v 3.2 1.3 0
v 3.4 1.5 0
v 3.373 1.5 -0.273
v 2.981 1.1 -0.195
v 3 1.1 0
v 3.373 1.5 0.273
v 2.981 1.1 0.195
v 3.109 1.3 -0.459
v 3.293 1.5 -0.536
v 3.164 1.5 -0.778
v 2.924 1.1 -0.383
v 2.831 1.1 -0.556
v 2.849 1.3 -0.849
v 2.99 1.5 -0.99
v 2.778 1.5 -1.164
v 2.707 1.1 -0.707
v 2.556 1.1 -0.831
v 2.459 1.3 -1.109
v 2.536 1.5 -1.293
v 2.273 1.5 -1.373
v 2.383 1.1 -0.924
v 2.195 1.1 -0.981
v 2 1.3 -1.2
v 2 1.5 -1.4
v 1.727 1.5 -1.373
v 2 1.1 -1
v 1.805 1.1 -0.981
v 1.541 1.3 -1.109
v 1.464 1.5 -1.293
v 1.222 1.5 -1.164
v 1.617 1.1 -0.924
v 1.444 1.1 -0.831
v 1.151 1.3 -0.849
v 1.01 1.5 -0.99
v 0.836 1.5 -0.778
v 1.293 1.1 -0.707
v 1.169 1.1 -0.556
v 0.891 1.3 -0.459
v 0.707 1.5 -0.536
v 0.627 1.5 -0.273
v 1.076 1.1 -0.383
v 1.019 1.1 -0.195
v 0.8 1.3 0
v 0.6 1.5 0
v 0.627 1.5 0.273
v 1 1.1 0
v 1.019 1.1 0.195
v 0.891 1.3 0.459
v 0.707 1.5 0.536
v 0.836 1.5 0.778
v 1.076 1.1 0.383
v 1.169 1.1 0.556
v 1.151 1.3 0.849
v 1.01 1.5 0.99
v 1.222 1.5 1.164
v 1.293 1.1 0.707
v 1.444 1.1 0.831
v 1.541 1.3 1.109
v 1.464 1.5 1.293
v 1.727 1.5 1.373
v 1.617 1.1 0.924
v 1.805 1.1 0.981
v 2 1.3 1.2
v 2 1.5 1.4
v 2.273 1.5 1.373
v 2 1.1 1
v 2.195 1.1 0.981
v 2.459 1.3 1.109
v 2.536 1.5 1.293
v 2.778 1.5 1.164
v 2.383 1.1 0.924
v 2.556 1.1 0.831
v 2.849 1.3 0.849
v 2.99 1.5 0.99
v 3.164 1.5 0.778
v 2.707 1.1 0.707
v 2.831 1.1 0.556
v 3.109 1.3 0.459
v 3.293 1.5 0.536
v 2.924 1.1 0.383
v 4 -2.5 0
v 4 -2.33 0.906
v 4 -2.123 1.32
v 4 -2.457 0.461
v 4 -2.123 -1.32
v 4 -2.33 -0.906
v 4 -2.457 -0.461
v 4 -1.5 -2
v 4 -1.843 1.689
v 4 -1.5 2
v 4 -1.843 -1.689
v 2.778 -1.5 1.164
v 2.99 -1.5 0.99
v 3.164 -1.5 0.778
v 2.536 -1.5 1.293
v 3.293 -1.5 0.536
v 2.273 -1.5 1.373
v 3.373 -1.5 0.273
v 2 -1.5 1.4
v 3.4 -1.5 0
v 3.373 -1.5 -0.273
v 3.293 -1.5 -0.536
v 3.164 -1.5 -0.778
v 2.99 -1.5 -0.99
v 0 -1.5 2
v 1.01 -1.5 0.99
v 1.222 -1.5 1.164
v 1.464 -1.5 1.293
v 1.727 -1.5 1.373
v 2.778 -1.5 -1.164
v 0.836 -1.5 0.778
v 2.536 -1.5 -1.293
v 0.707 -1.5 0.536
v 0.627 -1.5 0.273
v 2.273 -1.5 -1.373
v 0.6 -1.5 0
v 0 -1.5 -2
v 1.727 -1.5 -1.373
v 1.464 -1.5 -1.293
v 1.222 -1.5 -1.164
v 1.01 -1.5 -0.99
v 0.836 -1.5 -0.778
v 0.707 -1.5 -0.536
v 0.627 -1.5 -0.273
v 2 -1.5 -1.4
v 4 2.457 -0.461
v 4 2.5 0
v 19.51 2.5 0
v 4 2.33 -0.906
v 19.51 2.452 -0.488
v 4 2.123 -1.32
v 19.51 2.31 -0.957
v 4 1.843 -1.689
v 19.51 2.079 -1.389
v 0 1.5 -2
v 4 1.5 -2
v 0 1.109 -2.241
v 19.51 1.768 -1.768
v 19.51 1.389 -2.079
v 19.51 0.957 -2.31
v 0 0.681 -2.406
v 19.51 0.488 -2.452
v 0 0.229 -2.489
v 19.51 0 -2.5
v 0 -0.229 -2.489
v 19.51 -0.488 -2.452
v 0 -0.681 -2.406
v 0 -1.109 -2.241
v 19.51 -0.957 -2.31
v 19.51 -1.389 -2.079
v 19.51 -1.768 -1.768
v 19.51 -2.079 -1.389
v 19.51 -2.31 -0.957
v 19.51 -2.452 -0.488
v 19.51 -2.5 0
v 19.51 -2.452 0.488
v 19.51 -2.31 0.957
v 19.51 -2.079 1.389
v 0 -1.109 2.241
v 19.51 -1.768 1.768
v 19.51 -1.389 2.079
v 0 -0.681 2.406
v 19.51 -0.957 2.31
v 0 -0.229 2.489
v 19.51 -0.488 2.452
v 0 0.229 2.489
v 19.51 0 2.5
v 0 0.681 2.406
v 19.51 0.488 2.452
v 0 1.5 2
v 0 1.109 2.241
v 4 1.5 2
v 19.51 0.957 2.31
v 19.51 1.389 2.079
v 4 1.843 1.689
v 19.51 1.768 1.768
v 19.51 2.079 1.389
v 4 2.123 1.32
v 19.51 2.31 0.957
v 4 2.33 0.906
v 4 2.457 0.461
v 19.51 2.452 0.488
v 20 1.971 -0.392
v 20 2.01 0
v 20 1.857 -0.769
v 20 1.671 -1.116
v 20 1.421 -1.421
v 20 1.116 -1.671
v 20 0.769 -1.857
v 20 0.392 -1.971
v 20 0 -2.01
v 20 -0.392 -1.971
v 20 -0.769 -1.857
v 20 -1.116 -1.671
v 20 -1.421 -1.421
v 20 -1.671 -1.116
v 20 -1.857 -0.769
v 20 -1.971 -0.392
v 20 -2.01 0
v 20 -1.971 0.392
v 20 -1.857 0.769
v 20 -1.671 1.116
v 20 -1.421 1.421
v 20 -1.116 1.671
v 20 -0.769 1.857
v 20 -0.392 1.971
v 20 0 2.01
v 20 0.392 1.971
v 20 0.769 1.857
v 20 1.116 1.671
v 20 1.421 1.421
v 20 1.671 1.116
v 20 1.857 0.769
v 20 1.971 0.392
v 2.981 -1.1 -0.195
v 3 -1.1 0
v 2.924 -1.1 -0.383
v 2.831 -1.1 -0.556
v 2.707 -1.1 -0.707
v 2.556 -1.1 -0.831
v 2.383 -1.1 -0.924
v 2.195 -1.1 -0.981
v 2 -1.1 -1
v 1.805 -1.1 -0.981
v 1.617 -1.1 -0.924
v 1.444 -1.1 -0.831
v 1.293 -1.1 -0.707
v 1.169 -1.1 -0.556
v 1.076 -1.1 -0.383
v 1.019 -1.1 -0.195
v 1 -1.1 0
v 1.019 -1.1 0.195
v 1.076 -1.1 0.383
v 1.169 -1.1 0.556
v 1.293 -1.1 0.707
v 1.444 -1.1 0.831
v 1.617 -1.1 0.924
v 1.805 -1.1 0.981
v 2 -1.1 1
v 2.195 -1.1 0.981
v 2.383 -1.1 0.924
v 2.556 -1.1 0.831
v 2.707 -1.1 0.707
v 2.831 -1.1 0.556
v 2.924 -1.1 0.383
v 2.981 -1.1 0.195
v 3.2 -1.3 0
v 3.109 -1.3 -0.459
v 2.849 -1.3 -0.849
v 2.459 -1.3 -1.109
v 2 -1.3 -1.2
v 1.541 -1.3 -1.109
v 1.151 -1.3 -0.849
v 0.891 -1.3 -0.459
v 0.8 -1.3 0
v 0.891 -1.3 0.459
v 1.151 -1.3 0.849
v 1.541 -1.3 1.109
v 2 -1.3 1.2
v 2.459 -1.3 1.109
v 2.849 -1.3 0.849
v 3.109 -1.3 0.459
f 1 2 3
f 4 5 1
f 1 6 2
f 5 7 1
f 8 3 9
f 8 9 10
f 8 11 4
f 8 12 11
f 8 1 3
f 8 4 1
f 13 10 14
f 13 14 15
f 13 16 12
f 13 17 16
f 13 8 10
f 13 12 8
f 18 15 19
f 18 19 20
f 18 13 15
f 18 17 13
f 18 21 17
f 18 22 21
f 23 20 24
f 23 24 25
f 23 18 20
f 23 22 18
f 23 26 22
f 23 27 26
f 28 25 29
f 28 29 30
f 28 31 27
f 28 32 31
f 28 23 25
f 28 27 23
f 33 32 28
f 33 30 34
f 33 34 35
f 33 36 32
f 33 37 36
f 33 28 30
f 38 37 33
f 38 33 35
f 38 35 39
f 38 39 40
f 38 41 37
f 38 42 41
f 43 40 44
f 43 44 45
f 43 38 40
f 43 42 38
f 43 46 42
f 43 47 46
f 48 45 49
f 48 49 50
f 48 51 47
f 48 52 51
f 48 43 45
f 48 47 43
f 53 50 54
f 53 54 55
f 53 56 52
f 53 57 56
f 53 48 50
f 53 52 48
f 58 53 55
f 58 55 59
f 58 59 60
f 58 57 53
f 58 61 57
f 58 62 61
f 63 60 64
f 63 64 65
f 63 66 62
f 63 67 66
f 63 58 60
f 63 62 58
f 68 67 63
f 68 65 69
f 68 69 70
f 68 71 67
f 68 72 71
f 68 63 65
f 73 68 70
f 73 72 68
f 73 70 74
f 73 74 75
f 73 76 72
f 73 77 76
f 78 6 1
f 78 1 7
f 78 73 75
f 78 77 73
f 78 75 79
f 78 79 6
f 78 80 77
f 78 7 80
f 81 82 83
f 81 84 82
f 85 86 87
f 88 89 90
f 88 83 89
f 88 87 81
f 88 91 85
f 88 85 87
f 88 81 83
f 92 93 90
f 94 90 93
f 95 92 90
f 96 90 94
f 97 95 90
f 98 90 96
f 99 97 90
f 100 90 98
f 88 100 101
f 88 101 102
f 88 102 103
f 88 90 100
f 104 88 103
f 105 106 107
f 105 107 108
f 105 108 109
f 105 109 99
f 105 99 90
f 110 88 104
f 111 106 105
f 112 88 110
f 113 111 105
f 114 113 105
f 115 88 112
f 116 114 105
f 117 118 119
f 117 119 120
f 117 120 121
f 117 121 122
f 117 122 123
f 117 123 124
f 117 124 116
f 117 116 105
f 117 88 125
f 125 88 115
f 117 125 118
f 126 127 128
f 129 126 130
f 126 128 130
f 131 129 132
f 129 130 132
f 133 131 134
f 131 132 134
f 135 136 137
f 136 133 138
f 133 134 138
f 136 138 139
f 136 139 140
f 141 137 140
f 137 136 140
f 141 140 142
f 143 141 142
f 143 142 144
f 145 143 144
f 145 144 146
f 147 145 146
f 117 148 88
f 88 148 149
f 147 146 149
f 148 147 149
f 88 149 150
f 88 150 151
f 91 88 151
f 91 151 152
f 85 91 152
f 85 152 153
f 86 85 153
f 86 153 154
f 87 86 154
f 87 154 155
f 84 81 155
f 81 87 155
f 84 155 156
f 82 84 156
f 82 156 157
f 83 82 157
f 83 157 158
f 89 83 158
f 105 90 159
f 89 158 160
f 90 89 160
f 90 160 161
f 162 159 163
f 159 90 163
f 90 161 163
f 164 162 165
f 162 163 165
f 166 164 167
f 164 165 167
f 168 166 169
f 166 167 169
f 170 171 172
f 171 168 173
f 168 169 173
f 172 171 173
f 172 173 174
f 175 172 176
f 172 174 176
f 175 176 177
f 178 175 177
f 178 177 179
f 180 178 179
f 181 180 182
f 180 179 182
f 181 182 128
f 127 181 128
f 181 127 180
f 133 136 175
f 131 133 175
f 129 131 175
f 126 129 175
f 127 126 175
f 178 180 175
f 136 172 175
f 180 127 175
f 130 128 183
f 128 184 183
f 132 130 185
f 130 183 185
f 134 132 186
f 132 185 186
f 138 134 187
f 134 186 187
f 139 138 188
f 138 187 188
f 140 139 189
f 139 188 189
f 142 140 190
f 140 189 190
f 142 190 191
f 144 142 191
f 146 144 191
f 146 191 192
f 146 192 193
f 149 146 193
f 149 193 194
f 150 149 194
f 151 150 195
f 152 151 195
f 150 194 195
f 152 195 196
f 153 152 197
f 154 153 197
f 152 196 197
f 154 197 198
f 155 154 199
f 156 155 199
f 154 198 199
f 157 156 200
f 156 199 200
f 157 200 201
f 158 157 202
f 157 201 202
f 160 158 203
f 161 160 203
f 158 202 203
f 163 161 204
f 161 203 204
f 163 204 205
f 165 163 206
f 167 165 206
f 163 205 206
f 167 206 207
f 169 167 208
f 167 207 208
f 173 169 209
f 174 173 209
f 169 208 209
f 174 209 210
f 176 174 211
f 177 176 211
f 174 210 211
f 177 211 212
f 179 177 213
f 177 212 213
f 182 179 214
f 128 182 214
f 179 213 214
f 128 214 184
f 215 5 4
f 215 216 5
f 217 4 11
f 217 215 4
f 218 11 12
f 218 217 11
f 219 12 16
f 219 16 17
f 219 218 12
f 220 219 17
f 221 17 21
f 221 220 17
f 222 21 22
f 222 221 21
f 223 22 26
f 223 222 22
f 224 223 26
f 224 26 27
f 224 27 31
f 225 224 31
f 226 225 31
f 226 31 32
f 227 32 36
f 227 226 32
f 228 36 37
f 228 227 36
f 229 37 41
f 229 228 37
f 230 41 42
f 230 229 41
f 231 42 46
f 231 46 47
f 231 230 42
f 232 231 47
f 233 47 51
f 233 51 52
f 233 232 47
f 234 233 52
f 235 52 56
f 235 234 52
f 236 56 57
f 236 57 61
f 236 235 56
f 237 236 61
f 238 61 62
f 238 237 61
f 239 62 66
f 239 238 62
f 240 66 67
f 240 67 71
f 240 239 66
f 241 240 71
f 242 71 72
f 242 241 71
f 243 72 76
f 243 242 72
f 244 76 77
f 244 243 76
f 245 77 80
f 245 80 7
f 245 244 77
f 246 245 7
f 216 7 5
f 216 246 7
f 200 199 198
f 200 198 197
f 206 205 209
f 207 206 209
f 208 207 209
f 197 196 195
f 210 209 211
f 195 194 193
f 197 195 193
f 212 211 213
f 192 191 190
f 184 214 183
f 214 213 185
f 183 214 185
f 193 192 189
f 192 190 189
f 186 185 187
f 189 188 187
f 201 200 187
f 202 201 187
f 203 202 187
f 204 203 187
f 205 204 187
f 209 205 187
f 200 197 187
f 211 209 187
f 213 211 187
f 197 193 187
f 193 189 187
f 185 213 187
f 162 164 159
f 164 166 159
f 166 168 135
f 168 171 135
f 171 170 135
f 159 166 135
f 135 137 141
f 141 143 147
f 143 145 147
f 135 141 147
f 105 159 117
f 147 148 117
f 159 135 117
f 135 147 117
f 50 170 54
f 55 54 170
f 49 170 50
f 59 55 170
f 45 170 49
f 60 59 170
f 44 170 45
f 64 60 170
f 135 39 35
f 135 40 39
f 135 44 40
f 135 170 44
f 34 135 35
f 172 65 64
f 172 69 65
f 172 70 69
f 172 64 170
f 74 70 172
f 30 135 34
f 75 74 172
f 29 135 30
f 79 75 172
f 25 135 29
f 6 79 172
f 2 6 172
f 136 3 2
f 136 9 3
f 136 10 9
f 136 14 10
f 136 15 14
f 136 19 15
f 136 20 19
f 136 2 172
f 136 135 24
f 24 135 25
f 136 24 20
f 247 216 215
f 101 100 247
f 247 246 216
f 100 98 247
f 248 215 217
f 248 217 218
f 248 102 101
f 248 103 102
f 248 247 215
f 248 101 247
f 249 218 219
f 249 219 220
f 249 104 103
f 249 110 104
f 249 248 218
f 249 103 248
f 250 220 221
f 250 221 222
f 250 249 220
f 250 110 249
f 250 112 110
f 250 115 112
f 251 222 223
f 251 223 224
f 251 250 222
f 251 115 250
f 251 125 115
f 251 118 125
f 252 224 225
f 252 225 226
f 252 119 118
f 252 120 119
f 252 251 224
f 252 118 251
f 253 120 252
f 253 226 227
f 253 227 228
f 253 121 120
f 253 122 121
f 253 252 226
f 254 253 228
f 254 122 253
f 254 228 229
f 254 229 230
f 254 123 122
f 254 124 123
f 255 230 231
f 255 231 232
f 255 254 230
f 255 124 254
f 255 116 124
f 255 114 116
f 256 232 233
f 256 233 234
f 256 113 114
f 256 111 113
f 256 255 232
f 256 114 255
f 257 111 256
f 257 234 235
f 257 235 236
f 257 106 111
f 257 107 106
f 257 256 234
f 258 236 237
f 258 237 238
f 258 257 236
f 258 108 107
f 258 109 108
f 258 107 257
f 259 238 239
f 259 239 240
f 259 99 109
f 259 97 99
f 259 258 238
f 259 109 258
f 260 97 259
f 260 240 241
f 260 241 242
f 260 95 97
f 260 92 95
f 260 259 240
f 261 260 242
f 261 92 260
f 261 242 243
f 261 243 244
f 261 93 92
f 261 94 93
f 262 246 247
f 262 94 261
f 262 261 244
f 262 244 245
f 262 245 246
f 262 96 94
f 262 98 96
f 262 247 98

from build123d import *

# Parameters (mm, degrees)
CUT_EXTRUDE1_DEPTH      = 2.5
CUT_EXTRUDE1_DEPTH_BACK = 2.5


with BuildPart() as part:
    # Sketch1 → Revolve1 (revolve)
    with BuildSketch(Plane.XY):
        Polygon((0, 0), (0, 2.5), (19.5095, 2.5), (20, 2.0095), (20, 0), align=None)
    revolve(axis=Axis((20, 0, 0), (-1, 0, 0)))

    # Sketch2 → Cut-Extrude1 (cut, two sides: drawn at the far end of the back side and taken through both)
    with BuildSketch(Plane.XY.offset(-CUT_EXTRUDE1_DEPTH_BACK)):
        Polygon((-1, 3), (-1, -3), (4, -3), (4, -1.5), (0, -1.5), (0, 1.5), (4, 1.5), (4, 3), align=None)
    extrude(amount=CUT_EXTRUDE1_DEPTH + CUT_EXTRUDE1_DEPTH_BACK, mode=Mode.SUBTRACT)

    # Sketch3 → Cut-Revolve1 (revolve, cut)
    with BuildSketch(Plane.XY):
        Polygon((2, 1.5), (3.4, 1.5), (3, 1.1), (3, -1.1), (3.4, -1.5), (2, -1.5), align=None)
    revolve(axis=Axis((2, -1.5, 0), (0, 1, 0)), mode=Mode.SUBTRACT)


solid = part.part
